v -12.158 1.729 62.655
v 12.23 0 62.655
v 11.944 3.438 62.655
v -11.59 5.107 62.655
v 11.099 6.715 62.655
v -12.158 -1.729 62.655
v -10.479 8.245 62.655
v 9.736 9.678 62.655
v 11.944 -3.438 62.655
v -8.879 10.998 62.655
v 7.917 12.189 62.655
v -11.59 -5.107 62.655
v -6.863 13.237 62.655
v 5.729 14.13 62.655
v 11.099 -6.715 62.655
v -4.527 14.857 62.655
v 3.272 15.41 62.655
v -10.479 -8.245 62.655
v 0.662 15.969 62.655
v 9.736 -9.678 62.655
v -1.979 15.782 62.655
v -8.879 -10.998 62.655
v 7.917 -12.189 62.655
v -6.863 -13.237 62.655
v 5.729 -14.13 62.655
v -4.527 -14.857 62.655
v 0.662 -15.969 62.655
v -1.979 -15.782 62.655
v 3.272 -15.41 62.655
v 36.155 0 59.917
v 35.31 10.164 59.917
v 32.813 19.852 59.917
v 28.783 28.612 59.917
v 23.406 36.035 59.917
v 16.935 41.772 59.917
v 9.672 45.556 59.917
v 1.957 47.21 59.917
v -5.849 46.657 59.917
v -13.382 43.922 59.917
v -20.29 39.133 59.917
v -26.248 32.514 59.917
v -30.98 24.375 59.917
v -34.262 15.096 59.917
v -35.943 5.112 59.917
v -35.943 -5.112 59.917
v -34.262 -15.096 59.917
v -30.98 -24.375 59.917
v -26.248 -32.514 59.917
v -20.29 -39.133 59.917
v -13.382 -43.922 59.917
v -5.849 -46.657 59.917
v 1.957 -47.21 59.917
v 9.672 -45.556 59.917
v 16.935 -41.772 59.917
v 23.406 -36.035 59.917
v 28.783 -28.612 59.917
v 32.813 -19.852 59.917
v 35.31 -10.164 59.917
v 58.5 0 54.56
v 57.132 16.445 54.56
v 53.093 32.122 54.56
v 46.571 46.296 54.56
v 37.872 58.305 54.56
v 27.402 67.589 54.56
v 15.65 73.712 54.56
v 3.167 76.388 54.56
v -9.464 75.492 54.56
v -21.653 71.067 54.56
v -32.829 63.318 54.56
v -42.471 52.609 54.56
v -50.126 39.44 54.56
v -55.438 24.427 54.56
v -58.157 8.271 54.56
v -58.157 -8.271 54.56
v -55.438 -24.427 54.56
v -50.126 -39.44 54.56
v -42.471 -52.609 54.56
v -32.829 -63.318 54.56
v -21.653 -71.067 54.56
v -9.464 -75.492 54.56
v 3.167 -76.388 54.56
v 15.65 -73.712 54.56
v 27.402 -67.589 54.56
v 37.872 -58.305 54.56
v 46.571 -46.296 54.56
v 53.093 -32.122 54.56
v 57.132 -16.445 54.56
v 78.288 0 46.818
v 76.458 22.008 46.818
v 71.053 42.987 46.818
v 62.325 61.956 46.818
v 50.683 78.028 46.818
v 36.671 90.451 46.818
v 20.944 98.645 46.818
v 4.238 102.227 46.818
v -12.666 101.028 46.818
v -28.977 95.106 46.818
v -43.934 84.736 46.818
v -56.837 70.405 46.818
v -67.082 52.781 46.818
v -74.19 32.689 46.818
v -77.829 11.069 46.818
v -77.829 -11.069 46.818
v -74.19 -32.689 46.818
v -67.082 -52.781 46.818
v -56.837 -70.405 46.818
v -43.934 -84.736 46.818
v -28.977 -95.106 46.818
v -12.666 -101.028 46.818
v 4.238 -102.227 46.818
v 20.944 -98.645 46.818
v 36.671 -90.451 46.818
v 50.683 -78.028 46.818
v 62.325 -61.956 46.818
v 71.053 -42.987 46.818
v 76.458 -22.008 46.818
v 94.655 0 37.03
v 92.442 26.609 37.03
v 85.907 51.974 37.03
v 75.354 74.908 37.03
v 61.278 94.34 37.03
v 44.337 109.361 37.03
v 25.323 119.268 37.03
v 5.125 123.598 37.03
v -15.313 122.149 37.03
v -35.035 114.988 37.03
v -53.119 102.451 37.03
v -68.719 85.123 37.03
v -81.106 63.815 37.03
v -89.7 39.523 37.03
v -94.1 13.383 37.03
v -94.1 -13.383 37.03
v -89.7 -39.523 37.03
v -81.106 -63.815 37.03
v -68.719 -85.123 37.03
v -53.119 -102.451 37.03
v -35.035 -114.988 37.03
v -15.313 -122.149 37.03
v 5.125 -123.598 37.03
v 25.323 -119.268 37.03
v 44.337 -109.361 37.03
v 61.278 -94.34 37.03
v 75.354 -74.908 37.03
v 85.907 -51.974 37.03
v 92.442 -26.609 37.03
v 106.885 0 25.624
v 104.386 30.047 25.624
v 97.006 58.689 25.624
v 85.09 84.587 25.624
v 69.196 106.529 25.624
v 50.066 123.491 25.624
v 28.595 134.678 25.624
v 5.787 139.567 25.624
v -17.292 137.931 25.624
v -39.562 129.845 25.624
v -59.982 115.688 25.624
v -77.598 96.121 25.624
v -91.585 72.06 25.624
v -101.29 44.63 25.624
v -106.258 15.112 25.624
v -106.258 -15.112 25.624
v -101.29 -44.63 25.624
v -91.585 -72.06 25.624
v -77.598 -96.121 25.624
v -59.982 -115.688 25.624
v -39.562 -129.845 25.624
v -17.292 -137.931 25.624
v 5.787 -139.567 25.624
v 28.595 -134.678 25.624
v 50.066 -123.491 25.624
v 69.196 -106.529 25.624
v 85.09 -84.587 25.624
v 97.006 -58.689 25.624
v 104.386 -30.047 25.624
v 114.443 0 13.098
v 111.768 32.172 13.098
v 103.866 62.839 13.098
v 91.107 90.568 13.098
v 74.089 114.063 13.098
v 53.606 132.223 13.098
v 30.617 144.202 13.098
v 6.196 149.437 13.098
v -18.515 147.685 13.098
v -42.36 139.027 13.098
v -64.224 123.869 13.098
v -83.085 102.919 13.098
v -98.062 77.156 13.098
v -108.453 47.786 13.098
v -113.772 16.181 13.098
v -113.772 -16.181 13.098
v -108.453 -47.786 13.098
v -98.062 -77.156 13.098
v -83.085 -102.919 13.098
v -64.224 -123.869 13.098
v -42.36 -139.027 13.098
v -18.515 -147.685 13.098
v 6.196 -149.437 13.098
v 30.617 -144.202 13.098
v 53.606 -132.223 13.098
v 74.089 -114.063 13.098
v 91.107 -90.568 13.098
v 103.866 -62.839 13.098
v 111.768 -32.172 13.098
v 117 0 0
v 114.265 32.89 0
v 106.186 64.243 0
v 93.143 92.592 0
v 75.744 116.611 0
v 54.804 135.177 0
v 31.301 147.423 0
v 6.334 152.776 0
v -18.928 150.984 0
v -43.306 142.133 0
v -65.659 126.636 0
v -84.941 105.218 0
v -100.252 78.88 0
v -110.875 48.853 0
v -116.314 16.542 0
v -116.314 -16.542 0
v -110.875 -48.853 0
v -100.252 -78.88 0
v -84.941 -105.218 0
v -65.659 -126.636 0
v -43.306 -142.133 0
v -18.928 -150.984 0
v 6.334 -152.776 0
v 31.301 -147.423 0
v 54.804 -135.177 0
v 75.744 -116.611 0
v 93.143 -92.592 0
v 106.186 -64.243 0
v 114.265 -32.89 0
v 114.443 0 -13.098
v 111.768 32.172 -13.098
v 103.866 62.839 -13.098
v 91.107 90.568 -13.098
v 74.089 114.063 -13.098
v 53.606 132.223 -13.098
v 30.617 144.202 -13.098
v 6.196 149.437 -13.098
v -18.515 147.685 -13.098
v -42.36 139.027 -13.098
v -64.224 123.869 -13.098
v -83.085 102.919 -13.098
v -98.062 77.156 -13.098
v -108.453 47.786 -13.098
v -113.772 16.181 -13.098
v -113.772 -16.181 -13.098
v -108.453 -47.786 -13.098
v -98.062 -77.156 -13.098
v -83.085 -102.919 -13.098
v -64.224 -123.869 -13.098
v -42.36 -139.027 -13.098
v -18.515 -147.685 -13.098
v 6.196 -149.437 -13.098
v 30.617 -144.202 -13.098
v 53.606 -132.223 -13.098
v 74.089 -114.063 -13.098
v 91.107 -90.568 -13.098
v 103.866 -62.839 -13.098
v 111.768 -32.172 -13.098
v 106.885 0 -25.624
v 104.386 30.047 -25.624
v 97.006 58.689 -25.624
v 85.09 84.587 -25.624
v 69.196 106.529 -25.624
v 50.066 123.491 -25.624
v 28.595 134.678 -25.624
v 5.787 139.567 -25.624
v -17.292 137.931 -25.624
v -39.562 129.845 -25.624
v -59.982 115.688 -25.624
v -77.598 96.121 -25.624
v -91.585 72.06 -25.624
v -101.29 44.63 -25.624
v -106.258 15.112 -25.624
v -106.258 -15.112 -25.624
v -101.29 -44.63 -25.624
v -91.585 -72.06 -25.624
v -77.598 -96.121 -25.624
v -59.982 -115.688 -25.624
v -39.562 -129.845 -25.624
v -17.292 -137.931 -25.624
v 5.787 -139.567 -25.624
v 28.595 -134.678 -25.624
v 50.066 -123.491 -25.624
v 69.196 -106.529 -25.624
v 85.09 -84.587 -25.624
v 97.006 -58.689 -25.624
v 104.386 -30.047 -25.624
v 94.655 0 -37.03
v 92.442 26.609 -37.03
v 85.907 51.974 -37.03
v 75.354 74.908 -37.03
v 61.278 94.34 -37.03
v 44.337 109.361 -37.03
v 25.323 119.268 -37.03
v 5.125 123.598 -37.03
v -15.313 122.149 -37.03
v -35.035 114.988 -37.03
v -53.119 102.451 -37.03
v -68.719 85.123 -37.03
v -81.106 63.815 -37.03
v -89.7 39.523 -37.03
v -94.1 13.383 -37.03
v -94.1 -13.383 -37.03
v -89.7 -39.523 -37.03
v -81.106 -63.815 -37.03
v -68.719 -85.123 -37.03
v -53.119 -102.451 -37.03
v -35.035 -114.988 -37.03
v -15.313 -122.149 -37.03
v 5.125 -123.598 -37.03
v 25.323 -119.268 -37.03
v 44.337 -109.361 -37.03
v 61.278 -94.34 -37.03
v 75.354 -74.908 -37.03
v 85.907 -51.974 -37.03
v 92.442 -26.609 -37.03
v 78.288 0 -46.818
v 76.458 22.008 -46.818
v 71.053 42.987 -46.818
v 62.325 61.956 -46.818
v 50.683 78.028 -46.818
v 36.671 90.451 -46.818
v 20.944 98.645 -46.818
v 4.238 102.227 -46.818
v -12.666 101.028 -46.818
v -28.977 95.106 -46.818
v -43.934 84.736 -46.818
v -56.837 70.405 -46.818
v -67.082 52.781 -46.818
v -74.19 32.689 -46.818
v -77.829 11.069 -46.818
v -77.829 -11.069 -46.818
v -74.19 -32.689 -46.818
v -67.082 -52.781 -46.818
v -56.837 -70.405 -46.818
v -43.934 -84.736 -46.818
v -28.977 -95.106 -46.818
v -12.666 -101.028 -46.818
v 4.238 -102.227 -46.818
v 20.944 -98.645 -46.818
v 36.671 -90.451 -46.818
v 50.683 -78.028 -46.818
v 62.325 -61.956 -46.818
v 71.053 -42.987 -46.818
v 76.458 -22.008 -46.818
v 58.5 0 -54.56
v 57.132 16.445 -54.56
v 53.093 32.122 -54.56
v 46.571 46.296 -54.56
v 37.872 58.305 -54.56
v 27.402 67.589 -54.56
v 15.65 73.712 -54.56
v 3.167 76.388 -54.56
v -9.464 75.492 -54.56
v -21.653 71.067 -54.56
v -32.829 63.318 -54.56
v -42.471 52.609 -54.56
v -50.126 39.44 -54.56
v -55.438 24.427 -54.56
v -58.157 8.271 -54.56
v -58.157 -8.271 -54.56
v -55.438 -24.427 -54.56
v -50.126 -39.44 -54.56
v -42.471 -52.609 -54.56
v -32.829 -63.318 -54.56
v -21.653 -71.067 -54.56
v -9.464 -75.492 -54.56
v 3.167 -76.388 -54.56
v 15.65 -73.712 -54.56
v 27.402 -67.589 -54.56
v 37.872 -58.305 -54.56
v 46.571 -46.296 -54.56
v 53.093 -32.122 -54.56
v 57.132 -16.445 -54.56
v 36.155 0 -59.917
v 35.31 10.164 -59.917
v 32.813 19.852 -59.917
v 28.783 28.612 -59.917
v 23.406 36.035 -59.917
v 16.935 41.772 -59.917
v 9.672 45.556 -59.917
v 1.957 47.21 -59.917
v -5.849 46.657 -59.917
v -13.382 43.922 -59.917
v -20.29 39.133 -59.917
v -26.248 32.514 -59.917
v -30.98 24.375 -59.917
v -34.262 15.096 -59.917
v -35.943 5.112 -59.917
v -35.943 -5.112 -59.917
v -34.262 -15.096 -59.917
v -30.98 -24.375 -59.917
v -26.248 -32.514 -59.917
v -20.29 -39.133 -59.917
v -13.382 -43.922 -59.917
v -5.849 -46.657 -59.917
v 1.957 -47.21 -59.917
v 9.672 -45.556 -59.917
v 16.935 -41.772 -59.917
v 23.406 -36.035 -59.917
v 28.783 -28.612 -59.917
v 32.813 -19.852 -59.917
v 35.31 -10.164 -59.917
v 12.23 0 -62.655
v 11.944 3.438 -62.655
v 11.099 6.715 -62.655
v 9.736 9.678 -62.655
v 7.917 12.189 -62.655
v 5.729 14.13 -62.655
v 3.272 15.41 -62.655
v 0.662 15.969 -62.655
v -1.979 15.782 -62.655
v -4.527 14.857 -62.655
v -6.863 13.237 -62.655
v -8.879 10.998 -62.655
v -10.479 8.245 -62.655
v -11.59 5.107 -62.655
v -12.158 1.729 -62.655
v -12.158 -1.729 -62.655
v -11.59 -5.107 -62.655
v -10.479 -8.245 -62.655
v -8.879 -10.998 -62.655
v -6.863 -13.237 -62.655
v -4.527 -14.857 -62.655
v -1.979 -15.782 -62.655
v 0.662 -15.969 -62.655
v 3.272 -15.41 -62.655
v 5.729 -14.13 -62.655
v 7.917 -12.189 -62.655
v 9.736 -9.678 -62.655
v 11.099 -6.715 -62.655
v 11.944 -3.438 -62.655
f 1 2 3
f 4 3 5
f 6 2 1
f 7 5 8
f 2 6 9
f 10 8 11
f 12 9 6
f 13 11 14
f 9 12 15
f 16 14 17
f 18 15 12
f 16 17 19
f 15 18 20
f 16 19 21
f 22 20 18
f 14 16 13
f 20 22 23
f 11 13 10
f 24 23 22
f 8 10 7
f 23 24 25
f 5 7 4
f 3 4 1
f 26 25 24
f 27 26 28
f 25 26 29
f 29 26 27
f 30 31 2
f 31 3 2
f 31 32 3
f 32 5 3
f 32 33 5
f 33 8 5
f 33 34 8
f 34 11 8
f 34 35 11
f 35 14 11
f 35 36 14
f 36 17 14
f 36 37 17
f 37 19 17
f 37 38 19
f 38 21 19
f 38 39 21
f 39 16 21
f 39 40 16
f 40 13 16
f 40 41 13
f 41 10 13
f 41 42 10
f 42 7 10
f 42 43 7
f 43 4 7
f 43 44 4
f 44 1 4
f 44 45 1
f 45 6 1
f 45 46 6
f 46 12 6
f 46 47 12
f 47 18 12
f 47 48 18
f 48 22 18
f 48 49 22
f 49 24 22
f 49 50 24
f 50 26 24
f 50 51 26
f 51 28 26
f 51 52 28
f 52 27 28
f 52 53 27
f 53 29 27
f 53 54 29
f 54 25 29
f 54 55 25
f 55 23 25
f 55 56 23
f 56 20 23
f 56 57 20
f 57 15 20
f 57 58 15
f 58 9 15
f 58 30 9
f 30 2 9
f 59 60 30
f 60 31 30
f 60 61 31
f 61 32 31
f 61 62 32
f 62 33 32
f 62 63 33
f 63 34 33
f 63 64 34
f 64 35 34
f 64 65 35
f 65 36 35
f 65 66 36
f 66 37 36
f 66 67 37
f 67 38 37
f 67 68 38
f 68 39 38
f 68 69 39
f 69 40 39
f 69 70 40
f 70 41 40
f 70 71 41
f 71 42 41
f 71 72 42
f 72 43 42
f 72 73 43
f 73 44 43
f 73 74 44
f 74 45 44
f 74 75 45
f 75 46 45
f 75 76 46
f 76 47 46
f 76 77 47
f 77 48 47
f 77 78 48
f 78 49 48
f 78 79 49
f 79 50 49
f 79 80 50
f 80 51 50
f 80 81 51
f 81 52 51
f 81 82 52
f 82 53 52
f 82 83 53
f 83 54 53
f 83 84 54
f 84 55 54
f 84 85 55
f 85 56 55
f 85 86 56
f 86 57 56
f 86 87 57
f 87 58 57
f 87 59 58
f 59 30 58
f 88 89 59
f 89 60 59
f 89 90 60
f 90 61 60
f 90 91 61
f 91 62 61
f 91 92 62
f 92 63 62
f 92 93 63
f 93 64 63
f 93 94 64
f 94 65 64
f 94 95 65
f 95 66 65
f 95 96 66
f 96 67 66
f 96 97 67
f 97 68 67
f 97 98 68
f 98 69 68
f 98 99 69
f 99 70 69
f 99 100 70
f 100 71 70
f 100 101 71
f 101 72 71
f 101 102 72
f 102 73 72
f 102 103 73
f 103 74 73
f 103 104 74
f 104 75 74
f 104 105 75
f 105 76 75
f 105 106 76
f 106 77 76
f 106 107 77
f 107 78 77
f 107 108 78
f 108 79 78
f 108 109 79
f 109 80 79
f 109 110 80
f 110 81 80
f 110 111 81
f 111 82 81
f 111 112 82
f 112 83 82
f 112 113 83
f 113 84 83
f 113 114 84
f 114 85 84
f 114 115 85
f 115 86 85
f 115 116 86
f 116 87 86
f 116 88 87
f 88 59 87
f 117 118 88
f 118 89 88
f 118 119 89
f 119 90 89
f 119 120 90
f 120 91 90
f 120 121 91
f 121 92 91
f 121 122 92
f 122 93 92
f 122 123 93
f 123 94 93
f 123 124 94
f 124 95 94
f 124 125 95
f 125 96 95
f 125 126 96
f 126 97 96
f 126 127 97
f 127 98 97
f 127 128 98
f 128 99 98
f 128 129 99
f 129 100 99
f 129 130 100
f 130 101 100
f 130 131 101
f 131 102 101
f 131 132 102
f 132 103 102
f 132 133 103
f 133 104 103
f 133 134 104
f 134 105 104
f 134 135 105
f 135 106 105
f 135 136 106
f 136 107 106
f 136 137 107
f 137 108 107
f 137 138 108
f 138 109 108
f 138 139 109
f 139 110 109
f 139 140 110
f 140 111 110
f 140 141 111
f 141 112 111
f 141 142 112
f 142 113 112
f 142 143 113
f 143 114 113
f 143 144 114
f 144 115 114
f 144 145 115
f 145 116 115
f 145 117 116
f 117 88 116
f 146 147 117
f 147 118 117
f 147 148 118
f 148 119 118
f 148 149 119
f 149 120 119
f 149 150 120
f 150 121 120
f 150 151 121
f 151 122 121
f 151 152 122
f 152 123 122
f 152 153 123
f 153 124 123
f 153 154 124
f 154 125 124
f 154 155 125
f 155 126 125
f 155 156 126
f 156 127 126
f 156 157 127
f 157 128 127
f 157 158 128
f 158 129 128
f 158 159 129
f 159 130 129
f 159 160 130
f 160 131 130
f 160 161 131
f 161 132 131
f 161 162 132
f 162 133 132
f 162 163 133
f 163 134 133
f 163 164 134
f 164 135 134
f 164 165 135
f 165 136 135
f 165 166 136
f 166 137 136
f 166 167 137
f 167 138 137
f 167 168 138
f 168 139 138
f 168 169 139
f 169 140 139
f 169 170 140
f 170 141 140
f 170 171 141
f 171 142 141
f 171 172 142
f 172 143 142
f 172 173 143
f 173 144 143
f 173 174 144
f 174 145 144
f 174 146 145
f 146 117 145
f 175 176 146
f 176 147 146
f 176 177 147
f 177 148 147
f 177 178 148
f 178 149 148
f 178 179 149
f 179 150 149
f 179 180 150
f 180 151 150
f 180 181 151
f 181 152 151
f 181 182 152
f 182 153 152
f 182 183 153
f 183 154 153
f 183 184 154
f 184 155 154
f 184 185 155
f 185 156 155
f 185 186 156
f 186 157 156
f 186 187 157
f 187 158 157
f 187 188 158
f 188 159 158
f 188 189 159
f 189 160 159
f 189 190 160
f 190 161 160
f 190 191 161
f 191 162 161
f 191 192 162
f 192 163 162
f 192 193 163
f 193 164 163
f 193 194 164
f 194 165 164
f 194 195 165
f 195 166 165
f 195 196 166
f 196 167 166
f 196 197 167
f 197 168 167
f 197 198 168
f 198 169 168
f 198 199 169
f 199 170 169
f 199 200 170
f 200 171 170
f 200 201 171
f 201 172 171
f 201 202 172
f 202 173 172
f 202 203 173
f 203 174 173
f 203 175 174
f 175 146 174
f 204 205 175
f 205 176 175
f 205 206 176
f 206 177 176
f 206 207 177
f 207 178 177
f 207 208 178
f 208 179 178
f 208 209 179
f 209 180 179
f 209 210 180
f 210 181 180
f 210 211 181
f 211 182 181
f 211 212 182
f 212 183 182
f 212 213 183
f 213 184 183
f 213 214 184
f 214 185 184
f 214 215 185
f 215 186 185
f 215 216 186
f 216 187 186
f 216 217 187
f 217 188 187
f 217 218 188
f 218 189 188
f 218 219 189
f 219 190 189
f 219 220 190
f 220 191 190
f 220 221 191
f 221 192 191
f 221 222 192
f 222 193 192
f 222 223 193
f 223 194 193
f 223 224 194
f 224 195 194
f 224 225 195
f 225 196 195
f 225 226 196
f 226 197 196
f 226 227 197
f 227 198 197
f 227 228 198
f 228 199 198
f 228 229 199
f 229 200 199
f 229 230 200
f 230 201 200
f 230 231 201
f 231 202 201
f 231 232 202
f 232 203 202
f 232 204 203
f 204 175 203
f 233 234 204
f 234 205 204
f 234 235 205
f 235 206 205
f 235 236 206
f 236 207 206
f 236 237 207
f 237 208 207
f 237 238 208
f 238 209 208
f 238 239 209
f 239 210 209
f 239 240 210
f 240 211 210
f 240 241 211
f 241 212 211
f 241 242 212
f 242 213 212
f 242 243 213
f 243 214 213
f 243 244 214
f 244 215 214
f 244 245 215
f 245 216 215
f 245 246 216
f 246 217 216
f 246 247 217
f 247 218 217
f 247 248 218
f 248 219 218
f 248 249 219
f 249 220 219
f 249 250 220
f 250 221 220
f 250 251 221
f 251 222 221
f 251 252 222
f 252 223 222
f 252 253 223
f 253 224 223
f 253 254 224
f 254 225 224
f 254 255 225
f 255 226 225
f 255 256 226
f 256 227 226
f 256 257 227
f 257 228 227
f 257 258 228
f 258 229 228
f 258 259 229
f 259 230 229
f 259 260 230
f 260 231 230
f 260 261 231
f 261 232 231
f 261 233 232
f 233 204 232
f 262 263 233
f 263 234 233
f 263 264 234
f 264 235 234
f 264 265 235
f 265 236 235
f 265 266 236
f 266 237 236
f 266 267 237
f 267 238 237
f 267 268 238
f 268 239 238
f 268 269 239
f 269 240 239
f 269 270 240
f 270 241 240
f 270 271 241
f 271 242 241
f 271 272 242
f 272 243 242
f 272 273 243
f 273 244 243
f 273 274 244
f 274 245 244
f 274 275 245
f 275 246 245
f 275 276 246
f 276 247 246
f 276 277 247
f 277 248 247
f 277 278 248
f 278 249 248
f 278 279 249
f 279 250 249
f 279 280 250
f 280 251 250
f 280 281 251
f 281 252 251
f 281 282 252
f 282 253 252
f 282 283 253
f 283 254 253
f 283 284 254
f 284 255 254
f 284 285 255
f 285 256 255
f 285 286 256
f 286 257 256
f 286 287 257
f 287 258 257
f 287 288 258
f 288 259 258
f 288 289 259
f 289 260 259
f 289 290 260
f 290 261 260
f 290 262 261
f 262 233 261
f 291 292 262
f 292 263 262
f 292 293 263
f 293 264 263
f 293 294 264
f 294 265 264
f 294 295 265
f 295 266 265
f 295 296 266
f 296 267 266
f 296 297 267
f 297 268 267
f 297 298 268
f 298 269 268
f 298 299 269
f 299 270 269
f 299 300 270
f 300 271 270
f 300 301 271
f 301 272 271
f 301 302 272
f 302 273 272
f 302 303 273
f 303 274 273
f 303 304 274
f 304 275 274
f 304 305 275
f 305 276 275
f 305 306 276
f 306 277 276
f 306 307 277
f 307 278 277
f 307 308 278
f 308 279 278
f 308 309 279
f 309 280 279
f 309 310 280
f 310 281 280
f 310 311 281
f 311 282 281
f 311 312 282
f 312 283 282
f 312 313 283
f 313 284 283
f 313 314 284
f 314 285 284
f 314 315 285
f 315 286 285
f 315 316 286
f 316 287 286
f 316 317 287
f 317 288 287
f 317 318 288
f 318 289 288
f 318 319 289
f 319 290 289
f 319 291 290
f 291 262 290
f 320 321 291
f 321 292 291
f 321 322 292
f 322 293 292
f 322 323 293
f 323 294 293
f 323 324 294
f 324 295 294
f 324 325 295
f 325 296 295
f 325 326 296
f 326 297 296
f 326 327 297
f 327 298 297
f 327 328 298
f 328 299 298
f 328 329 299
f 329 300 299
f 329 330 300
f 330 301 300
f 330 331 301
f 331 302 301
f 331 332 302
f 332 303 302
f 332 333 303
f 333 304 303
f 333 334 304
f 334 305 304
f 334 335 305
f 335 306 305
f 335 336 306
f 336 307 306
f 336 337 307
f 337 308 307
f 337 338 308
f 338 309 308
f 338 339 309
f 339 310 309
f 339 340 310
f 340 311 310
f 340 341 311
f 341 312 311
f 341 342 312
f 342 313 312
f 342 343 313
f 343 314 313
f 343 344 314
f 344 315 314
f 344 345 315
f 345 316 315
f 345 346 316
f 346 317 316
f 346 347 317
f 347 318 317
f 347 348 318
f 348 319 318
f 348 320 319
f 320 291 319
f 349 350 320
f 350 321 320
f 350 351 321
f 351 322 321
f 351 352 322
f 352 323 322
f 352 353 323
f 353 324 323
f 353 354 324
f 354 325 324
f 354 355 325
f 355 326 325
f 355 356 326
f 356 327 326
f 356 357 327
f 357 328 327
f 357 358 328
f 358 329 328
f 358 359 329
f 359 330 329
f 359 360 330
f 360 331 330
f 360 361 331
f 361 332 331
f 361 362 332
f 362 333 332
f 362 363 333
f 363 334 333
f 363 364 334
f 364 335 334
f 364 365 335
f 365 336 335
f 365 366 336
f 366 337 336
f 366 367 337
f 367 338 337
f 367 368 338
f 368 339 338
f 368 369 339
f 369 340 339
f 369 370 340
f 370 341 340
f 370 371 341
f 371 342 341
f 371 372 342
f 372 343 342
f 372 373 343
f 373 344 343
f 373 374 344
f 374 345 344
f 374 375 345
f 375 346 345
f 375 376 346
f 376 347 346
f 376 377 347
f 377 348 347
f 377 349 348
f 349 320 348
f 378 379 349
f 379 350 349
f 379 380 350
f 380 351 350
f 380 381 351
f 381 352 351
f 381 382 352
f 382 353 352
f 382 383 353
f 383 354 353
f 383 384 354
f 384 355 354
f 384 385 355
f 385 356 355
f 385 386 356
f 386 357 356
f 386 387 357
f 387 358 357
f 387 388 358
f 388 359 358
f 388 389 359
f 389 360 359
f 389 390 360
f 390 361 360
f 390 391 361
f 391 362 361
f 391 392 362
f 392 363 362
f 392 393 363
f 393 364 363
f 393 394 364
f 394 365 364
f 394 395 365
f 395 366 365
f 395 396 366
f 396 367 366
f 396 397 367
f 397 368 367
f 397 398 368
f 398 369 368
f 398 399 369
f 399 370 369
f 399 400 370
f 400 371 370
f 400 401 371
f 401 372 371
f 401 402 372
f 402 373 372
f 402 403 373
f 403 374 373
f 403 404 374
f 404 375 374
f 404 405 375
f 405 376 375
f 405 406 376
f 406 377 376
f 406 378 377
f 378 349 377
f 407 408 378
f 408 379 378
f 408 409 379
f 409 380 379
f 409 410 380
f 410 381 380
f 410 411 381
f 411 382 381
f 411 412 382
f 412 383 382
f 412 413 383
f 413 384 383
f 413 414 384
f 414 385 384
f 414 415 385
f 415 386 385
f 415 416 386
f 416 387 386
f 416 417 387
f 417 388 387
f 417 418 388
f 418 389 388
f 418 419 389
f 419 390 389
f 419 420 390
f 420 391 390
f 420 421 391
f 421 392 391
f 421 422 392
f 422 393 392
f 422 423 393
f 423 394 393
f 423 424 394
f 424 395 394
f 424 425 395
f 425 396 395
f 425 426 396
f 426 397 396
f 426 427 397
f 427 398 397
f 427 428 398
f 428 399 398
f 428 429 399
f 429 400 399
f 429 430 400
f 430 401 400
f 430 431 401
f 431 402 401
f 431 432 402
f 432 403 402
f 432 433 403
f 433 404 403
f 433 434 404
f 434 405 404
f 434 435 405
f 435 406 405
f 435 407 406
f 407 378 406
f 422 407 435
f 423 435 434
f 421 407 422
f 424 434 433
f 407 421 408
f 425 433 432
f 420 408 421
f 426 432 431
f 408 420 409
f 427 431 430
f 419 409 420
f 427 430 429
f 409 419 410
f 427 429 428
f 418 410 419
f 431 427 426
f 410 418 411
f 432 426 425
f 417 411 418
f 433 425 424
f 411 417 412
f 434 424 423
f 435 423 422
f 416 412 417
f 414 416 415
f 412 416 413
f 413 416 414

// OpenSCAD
// Generated by SolidPython 1.0.1 on 2020-07-29 00:46:51


scale(v = [13, 17, 7]) {
	sphere(r = 9);
}
/***********************************************
*********      SolidPython code:      **********
************************************************
 
# import packages: SolidPython
from solid import *
from solid.utils import *
from itertools import chain, combinations, permutations


class Resize:

    def __init__(self, scad_file):
        self.scad_file = scad_file
        #self.scad_file = import_scad(scad_file)
        # cone/cylinder param:
        self.r1 = 0
        self.r2 = 0
        self.h = 0
        # rectangular prism param:
        self.w = 0
        self.l = 0
        # ellipse param:
        self.r = 0

    # import OpenScad code (file name corresponds to shape)


    # classify shape + parameters
    def assign(self, param1, param2, param3):
        if self.scad_file == 'cone.scad':
            self.r1 = param1
            self.r2 = param2
            self.h = param3
        elif self.scad_file == 'cylinder.scad':
            self.r1 = param1
            self.r2 = param2
            self.h = param3
        elif self.scad_file == 'rectangularPrism.scad':
            self.h = param1
            self.l = param2
            self.w = param3
        else:
            self.r = param1
            self.h = param2

    # resize parameters
    def iterate(self):
        x = range(3, 20, 2)
        i = 1
        if self.scad_file == 'cone.scad':
            tempList = list(permutations(x, 2))
            for temp in tempList:
                param1 = temp[0]
                param2 = temp[1]
                filepath = 'produced_scad_files/' + 'cone' + str(param1) + '_' + str(param2) + '_' + '.scad'
                scad_render_to_file(cylinder(h=param1, r1=param2, r2=0), filepath)

        elif self.scad_file == 'cylinder.scad':
            tempList = list(permutations(x, 3))
            for temp in tempList:
                param1 = temp[0]
                param2 = temp[1]
                filepath = 'produced_scad_files/' + 'cylinder' + str(param1) + '_' + str(param2) + '_' + '.scad'
                scad_render_to_file(cylinder(h=param1, r1=param2, r2=param2), filepath)

        elif self.scad_file == 'rectangularPrism.scad':
            tempList = list(permutations(x, 3))
            for temp in tempList:
                param1 = temp[0]
                param2 = temp[1]
                param3 = temp[2]
                filepath = 'produced_scad_files/' + 'rectangularPrism' + str(param1) + '_' + str(param2) + '_' + str(
                    param3) + '.scad'
                scad_render_to_file(cube(size=(param1, param2, param3)), filepath)

        elif self.scad_file == 'ellipse.scad':
            tempList = list(permutations(x, 4))
            for temp in tempList:
                param1 = temp[0]
                param2 = temp[1]
                param3 = temp[2]
                param4 = temp[3]
                filepath = 'produced_scad_files/' + 'ellipse' + str(param1) + '_' + str(param2) + '_' + str(param3) + '_' + str(param4) + '.scad'
                scad_render_to_file(scale([param1, param2, param3])(sphere(r=param4)), filepath)

    def render_to_scadfile(self):
        scad_render_to_file(scad, 'example.scad') 
 
************************************************/
